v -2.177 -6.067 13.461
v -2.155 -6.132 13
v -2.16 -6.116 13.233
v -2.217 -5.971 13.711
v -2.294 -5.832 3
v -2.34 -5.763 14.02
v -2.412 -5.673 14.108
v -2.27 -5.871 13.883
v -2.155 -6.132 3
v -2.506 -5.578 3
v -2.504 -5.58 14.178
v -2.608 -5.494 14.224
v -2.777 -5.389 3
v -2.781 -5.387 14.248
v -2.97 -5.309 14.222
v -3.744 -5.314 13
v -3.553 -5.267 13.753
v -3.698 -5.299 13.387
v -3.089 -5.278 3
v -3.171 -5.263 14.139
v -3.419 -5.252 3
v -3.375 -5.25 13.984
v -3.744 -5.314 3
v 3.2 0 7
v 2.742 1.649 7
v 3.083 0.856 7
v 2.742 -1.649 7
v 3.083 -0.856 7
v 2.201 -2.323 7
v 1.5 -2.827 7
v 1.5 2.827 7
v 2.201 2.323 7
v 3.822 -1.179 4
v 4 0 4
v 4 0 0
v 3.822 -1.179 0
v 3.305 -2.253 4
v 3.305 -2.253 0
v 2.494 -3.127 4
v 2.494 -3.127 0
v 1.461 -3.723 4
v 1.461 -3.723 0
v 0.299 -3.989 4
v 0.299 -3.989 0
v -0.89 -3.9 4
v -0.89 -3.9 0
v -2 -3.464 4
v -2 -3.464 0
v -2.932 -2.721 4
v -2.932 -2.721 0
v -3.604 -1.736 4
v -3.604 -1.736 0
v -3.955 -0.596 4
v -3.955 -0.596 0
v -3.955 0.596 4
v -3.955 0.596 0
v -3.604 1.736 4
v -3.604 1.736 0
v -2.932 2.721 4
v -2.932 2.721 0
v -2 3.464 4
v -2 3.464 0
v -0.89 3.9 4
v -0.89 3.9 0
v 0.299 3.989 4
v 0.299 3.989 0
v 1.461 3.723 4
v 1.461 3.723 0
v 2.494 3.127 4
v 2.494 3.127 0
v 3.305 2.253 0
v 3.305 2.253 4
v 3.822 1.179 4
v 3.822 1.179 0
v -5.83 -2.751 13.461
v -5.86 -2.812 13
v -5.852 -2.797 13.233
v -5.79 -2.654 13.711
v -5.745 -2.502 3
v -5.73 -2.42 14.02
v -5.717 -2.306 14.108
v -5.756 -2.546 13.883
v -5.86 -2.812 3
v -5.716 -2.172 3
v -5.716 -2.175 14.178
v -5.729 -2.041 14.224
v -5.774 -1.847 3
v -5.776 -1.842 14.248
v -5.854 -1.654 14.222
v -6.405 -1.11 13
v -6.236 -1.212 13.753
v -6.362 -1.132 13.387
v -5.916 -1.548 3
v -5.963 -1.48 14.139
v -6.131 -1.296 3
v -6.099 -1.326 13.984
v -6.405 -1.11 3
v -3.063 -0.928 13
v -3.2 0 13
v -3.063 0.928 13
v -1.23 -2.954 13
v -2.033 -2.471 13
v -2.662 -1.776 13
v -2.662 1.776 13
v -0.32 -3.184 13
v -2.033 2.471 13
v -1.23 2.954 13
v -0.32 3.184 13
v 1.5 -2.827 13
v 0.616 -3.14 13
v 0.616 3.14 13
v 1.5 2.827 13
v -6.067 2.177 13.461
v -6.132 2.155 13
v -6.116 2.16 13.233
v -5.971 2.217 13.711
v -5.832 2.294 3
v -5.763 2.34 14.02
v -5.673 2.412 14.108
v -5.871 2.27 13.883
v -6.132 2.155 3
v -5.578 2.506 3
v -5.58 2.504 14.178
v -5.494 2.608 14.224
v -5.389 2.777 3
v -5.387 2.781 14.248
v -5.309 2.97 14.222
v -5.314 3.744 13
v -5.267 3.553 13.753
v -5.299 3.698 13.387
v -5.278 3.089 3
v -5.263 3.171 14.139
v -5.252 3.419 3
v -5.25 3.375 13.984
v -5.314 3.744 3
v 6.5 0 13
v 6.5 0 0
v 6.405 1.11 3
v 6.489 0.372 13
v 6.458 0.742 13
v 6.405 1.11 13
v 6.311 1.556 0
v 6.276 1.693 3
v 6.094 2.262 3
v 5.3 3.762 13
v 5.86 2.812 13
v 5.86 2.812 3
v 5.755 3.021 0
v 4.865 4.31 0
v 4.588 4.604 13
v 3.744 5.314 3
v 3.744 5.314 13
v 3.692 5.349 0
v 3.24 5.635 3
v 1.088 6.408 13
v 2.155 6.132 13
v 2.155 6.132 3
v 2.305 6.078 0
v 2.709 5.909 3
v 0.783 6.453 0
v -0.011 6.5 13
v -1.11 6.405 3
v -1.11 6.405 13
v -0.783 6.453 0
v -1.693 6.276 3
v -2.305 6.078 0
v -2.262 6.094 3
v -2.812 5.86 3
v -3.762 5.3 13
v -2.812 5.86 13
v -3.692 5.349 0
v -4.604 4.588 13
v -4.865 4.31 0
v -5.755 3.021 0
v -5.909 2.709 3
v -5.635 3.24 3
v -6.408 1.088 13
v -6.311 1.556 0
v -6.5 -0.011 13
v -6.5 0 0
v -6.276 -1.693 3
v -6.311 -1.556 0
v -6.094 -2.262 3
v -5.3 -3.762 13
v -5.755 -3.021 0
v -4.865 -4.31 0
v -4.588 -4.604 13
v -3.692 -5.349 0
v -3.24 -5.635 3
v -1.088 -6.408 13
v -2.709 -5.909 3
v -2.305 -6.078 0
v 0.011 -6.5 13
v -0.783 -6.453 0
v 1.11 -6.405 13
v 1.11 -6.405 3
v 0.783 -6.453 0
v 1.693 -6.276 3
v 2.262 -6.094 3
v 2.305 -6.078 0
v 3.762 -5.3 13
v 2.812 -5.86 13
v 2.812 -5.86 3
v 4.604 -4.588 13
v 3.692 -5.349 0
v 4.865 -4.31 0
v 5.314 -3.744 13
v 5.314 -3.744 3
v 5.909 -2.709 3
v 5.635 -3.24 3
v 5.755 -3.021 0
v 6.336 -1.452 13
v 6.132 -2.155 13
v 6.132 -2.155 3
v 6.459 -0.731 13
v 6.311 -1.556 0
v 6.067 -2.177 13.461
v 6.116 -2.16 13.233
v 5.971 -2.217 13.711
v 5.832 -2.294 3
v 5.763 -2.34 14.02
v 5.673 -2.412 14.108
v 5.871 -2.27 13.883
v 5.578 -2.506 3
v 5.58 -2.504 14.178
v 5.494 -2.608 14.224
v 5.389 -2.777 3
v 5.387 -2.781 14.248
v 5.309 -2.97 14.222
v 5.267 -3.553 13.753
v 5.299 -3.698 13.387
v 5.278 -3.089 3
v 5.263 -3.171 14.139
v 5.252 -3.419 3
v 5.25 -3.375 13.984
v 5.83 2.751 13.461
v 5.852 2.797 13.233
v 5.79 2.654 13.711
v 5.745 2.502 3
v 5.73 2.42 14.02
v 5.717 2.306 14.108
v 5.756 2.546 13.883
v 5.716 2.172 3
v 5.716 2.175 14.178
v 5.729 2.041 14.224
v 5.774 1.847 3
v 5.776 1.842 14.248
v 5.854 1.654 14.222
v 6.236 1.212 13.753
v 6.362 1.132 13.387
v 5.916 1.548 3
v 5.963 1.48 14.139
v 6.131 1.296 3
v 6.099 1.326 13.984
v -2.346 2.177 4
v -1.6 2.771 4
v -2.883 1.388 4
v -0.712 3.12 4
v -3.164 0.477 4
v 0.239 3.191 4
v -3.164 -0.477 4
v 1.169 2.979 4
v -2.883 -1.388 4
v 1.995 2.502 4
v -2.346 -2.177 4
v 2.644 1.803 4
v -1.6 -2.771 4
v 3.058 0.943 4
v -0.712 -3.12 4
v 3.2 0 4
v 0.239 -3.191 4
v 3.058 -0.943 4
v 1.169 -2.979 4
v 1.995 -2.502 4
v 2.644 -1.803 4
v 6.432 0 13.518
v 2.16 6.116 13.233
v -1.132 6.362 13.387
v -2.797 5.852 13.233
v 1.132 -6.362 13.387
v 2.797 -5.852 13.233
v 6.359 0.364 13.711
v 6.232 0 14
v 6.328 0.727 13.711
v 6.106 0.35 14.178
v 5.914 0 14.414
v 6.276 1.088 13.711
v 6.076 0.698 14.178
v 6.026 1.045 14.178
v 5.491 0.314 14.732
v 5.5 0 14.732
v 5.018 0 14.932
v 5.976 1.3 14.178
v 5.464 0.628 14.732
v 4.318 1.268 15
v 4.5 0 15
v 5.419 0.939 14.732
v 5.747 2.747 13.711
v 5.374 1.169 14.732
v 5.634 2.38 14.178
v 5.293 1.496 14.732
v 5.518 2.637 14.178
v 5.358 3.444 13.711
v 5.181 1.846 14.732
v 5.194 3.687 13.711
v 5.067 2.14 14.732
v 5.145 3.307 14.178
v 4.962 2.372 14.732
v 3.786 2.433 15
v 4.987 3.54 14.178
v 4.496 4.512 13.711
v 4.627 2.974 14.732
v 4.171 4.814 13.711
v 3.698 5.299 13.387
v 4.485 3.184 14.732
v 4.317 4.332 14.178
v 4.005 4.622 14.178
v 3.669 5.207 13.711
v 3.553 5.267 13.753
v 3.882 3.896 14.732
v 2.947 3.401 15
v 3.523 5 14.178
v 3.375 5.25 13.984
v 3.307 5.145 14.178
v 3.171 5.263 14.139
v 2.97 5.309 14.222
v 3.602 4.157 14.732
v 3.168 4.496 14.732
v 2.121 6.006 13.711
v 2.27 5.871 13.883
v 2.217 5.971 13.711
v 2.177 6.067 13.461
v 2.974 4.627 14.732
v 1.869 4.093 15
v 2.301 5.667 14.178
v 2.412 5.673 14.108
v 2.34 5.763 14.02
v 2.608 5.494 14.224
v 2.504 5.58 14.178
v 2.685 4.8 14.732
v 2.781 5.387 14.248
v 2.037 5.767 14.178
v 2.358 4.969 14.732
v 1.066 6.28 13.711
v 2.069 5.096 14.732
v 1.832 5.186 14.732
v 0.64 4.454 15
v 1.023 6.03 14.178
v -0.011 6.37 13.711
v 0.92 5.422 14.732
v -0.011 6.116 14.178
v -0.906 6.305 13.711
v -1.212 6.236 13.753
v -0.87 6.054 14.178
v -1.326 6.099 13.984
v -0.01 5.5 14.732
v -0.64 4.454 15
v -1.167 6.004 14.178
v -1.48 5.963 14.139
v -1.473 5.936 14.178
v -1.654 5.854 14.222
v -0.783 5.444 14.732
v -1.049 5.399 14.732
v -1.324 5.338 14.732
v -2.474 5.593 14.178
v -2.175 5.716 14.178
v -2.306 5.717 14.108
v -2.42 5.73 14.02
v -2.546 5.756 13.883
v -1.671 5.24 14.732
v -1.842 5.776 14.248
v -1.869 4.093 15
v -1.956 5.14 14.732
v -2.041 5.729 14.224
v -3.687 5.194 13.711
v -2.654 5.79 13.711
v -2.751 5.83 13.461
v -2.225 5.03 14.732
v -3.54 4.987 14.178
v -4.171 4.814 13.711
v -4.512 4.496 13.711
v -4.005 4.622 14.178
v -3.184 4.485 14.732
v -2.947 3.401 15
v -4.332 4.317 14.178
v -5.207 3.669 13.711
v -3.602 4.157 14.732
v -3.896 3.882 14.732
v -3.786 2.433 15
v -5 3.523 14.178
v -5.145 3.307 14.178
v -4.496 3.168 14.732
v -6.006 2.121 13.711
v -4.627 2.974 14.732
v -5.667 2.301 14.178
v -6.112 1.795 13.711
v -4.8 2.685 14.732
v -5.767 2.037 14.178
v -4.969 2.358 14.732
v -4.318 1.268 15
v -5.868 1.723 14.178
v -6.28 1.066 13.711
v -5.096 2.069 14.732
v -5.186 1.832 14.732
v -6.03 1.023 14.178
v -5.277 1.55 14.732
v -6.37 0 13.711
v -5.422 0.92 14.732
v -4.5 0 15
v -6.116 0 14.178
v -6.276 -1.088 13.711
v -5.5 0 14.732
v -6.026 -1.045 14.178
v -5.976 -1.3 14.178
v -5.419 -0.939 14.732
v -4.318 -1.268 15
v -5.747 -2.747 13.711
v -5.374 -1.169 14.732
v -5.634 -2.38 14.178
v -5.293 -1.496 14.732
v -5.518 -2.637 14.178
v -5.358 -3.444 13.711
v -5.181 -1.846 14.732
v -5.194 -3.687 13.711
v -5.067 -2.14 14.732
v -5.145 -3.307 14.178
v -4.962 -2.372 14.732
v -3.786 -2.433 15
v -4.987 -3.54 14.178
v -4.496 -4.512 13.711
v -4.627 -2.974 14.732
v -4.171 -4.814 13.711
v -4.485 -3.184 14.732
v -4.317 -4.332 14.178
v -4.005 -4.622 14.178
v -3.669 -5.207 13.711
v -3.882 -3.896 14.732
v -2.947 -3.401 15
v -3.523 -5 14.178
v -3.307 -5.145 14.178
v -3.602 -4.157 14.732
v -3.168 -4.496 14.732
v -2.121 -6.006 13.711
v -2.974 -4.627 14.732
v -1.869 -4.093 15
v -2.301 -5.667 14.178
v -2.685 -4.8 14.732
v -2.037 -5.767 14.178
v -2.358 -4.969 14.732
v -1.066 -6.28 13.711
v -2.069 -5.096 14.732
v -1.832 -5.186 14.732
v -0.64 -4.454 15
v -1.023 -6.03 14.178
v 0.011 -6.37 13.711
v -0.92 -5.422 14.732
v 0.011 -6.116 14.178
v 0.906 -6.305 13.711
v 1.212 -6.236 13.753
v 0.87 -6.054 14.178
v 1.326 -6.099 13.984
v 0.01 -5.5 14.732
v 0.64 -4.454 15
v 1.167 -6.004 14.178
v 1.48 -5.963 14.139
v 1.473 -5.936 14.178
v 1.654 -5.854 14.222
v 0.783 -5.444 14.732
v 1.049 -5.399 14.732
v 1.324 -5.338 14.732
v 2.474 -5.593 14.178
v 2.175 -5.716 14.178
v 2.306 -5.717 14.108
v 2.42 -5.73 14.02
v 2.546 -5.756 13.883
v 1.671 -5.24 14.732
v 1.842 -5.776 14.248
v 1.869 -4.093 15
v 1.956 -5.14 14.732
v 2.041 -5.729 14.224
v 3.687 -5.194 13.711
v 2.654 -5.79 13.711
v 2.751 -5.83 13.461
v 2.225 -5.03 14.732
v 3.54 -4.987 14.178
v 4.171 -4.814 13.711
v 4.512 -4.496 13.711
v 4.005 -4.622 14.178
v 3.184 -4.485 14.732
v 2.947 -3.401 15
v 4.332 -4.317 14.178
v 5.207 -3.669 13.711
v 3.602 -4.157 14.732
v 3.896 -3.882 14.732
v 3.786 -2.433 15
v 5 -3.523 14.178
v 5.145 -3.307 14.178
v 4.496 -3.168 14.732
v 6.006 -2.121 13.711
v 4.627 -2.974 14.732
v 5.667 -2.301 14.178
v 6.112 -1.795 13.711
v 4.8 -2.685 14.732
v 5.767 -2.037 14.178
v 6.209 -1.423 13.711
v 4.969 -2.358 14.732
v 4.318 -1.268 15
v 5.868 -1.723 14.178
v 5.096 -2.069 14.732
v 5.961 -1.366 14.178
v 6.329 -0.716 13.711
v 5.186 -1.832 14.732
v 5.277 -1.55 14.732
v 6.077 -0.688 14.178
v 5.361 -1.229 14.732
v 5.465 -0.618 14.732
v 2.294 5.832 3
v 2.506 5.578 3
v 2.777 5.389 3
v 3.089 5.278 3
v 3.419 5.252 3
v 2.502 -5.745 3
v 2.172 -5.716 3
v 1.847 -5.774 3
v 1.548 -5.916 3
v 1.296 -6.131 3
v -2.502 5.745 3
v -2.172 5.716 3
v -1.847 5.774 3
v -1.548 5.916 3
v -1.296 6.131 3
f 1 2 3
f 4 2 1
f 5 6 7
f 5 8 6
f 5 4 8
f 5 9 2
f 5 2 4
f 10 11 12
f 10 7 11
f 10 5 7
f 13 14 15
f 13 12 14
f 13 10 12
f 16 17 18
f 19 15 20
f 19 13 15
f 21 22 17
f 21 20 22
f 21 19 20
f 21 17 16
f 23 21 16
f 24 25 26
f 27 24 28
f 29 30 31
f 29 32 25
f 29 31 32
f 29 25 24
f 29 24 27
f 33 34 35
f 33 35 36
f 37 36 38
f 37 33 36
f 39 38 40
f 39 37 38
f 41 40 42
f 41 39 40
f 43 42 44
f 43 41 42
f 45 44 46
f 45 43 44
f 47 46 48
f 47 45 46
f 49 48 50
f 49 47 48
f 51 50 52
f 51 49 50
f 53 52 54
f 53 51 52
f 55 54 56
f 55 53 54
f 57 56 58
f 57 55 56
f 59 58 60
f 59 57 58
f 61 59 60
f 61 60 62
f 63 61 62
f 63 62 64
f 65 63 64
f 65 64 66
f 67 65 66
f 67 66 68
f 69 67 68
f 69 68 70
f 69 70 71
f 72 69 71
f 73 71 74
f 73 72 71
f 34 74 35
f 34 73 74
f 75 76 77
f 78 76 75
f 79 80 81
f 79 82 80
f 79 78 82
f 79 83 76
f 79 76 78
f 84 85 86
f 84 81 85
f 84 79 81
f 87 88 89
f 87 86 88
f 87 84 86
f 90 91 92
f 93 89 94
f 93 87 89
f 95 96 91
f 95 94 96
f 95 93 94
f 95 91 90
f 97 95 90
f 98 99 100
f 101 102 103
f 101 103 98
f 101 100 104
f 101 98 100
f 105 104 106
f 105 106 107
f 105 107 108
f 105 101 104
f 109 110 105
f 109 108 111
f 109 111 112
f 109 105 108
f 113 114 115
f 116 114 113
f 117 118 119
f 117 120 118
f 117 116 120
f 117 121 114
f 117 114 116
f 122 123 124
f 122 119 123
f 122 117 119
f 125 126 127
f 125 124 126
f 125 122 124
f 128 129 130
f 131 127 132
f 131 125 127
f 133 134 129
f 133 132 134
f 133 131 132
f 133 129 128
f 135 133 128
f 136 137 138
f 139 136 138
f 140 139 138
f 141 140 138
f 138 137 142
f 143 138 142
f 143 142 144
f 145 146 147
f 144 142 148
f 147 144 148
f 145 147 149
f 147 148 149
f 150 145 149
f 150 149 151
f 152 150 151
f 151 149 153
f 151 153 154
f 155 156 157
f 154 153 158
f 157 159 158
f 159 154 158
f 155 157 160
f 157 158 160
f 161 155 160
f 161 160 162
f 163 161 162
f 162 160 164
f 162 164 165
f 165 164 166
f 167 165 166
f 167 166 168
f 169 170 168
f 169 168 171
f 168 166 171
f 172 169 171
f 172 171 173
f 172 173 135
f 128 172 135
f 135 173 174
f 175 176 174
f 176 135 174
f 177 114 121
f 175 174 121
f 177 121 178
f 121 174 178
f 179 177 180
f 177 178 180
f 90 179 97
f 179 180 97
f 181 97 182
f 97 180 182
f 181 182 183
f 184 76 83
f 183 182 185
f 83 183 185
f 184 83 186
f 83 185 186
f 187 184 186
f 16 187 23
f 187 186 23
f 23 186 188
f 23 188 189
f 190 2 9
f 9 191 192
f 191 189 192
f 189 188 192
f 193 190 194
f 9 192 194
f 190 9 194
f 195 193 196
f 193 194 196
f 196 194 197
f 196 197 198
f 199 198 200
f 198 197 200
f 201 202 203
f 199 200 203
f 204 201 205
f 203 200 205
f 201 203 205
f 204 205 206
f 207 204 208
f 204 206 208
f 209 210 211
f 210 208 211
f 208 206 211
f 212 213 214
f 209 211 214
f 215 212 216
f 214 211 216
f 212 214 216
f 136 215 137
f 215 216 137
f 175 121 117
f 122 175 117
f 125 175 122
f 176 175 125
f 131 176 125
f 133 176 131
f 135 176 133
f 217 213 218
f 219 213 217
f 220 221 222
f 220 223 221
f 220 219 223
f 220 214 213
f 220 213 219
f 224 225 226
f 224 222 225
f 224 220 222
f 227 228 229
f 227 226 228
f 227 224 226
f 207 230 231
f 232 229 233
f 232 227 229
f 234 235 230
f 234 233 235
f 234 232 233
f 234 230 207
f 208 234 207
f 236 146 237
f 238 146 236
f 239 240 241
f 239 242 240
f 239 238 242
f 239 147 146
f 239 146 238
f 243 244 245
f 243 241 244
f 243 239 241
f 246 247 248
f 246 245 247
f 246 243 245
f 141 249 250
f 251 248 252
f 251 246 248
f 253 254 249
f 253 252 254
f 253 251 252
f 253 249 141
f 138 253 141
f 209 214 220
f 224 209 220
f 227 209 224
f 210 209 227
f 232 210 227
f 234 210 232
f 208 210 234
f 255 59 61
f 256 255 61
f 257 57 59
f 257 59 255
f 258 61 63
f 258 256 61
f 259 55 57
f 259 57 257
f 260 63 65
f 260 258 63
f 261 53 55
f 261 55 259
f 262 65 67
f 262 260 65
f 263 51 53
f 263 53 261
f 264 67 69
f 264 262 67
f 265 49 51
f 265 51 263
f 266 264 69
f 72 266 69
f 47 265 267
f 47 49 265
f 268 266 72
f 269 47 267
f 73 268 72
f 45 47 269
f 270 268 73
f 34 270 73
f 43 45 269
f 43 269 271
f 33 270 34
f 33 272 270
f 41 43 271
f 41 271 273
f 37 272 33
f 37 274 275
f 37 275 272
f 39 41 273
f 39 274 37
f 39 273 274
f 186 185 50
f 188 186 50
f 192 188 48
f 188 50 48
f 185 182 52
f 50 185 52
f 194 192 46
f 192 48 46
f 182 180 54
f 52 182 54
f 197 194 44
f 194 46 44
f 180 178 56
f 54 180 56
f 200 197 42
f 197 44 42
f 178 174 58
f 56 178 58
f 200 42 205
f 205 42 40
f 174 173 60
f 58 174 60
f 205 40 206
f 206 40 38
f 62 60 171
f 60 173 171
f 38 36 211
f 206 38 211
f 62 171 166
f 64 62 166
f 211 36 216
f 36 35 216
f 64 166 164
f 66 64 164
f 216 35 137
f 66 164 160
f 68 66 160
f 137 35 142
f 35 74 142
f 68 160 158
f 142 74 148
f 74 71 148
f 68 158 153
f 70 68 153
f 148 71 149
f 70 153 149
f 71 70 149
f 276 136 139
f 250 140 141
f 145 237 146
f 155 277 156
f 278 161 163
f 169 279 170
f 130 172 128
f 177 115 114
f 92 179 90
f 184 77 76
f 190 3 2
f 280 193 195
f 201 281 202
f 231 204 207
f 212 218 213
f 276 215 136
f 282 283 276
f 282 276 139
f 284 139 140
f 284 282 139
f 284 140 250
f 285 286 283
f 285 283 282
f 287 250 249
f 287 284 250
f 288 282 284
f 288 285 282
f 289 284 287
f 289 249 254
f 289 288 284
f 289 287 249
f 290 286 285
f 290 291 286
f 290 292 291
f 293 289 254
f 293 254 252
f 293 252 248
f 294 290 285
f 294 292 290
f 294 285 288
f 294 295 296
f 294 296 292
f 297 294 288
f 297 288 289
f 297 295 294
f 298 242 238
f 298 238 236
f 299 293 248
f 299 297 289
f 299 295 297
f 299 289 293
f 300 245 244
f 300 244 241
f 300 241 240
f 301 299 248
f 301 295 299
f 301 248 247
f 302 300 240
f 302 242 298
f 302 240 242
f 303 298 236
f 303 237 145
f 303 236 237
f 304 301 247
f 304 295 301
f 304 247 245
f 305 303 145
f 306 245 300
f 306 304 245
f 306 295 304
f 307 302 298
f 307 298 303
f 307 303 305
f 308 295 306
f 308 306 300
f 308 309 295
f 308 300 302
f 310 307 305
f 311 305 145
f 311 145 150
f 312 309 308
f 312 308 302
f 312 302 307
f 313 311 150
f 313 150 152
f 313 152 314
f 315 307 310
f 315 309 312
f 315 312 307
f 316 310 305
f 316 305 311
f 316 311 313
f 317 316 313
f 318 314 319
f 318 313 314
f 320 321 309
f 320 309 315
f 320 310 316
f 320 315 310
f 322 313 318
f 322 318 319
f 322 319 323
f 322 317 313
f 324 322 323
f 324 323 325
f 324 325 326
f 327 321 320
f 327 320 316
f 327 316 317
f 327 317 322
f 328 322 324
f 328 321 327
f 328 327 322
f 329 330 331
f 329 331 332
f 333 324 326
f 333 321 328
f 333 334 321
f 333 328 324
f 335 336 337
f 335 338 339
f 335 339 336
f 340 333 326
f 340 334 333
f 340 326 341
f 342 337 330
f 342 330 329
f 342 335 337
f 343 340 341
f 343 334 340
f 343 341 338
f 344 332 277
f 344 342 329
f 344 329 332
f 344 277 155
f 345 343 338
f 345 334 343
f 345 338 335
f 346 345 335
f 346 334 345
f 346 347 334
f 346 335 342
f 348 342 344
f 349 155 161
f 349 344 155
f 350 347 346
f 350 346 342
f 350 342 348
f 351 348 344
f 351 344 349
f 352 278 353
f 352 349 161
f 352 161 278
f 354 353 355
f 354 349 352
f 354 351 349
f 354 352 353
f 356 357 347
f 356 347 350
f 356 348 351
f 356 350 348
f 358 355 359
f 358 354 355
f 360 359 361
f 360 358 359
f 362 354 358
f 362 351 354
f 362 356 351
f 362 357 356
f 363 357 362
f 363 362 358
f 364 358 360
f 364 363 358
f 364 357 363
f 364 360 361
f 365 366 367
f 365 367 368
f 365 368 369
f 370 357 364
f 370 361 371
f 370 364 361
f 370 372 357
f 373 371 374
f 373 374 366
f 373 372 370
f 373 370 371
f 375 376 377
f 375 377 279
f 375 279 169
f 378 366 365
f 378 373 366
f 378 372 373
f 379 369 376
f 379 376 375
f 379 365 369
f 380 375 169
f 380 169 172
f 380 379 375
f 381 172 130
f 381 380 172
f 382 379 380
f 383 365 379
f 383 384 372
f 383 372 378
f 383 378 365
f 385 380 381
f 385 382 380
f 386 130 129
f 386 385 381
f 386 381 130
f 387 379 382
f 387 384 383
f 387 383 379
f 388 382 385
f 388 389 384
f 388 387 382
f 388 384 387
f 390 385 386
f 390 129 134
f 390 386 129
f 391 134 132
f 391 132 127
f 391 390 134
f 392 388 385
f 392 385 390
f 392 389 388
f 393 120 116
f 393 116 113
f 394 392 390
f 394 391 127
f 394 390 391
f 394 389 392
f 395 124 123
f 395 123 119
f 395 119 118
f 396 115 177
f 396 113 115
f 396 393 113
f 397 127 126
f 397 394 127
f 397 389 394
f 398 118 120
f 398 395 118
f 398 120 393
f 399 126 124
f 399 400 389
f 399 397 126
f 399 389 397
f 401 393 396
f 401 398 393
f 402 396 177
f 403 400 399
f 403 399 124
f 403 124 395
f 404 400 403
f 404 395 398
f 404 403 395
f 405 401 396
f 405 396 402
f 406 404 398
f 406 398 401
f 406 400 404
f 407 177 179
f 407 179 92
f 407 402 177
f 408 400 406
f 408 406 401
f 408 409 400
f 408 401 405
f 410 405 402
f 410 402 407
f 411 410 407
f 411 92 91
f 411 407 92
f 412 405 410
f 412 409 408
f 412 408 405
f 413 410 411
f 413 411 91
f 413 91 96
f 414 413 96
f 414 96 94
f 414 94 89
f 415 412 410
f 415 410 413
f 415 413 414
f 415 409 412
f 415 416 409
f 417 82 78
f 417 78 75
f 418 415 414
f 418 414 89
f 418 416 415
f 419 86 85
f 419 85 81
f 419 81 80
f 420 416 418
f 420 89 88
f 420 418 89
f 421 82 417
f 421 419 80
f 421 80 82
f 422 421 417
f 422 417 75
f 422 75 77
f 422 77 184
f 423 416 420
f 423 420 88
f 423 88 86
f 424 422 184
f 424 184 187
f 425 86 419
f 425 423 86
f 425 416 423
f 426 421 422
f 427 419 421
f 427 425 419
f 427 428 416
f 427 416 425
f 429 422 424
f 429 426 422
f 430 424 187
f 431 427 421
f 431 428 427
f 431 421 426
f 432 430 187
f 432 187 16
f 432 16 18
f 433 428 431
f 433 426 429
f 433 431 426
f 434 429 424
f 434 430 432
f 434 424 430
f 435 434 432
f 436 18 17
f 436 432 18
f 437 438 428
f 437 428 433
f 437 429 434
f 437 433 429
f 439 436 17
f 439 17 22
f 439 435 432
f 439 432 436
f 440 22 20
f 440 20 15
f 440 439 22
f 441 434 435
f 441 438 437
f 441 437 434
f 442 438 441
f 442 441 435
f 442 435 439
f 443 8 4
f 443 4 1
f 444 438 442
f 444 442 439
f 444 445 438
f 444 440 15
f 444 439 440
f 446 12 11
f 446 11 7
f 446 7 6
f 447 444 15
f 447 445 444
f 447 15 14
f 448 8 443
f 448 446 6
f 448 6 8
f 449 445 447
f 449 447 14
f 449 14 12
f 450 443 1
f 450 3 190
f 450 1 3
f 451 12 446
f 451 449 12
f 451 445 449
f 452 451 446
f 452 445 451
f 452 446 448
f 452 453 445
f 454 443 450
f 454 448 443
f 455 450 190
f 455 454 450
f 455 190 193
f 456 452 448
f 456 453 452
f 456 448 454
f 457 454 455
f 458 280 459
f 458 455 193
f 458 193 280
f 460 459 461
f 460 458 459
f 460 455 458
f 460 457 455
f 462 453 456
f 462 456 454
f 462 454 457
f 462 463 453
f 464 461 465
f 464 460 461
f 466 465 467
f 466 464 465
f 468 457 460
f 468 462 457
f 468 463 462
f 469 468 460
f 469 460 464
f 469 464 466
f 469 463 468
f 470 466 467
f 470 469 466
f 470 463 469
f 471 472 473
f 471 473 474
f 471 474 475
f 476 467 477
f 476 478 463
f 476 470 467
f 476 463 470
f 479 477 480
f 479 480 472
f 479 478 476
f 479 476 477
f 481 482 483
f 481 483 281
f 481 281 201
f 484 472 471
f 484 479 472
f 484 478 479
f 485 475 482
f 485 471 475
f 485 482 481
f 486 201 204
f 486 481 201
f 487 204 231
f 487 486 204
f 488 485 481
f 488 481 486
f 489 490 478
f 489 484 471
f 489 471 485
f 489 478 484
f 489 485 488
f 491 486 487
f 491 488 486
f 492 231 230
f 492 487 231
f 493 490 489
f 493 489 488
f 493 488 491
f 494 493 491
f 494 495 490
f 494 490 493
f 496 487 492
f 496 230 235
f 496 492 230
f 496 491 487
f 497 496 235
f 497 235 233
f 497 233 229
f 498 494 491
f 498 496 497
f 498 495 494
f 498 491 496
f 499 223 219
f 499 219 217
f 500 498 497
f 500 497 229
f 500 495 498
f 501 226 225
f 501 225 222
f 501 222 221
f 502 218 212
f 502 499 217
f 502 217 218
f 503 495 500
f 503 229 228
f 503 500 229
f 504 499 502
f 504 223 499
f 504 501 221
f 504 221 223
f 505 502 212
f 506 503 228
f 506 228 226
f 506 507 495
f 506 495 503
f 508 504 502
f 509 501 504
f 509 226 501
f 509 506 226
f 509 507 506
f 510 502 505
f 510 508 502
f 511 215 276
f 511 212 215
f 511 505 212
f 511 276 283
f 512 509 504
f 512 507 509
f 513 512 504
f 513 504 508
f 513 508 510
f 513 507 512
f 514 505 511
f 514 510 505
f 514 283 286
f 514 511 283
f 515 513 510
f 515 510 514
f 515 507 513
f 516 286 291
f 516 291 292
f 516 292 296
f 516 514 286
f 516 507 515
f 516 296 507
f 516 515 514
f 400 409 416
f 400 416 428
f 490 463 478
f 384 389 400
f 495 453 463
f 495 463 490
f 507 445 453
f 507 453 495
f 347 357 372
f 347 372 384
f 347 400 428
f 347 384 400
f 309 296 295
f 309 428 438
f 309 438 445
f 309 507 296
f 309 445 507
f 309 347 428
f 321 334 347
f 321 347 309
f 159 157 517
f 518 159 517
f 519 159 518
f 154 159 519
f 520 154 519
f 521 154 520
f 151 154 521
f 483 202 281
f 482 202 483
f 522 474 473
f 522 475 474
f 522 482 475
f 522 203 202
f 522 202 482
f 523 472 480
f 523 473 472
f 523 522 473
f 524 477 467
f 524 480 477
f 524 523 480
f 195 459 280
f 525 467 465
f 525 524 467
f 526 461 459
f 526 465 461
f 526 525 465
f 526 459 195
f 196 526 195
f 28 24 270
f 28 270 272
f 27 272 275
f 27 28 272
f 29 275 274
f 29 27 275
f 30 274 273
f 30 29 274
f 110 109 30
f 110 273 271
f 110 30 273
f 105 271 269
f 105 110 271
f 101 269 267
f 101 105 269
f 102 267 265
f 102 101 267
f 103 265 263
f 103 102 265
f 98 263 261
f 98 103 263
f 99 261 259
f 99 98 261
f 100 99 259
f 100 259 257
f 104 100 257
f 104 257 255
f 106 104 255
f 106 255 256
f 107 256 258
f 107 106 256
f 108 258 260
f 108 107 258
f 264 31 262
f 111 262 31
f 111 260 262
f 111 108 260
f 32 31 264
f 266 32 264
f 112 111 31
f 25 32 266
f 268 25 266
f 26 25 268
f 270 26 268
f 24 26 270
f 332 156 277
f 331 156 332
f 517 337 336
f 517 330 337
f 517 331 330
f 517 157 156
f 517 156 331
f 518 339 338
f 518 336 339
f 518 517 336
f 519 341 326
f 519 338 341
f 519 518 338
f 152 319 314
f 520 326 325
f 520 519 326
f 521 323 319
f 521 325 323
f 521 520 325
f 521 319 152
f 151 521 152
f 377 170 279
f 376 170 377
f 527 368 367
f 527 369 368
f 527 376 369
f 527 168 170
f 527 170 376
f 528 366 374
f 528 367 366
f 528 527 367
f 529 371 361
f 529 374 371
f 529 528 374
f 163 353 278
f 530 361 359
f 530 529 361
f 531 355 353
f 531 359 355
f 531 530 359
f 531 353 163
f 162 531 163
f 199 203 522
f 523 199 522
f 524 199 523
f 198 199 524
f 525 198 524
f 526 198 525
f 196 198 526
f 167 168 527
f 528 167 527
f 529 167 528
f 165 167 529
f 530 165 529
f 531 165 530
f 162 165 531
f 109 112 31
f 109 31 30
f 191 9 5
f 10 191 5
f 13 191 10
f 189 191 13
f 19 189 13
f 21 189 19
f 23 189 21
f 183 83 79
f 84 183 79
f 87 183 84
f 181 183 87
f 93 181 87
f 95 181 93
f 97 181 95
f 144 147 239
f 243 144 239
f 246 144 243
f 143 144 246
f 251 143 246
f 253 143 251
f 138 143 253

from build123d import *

# Parameters (mm, degrees)
CYLINDER_R         = 6.5
CYLINDER_DEPTH     = 15
CYLINDER001_R      = 3.2
CYLINDER001_DEPTH  = 13
BOX_W              = 2
BOX_H              = 7.5
BOX_DEPTH          = 7
FILLET_R           = 2
CYLINDER002_R      = 1.25
CYLINDER002_DEPTH  = 12
POLARPATTERN_COUNT = 8
CYLINDER003_R      = 4
CYLINDER003_DEPTH  = 4


with BuildPart() as part:
    # Cylinder → Cylinder (join)
    with BuildSketch(Plane.XY):
        Circle(CYLINDER_R)
    extrude(amount=CYLINDER_DEPTH)

    # Cylinder001 → Cylinder001 (cut)
    with BuildSketch(Plane(origin=(0, 0, 13), x_dir=(1, 0, 0), z_dir=(0, 0, -1))):
        Circle(CYLINDER001_R)
    extrude(amount=CYLINDER001_DEPTH, mode=Mode.SUBTRACT)

    # Box → Box (join)
    with BuildSketch(Plane(origin=(1.5, 3.75, 14), x_dir=(1, 0, 0), z_dir=(0, 0, -1))):
        with Locations((1, 3.75)):
            Rectangle(BOX_W, BOX_H)
    extrude(amount=BOX_DEPTH)

    # Fillet
    fillet_edges = [part.edges().sort_by_distance(p)[0] for p in [
        (-6.5, 0, 15),
    ]]
    fillet(fillet_edges, radius=FILLET_R)

    # Cylinder002 → Cylinder002 (cut)
    with BuildSketch(Plane(origin=(-6.5, 3.35, 3), x_dir=(1, 0, 0), z_dir=(0, 0, 1))):
        Circle(CYLINDER002_R)
    cylinder002 = extrude(amount=CYLINDER002_DEPTH, mode=Mode.SUBTRACT)

    # PolarPattern: Cylinder002 ×8 about axis
    polarpattern_axis = Axis((0, 0, 0), (0, 0, 1))
    for i in range(1, POLARPATTERN_COUNT):
        add(cylinder002.rotate(polarpattern_axis, i * 360 / POLARPATTERN_COUNT), mode=Mode.SUBTRACT)

    # Cylinder003 → Cylinder003 (cut)
    with BuildSketch(Plane(origin=(0, 0, 4), x_dir=(1, 0, 0), z_dir=(0, 0, -1))):
        Circle(CYLINDER003_R)
    extrude(amount=CYLINDER003_DEPTH, mode=Mode.SUBTRACT)


solid = part.part
